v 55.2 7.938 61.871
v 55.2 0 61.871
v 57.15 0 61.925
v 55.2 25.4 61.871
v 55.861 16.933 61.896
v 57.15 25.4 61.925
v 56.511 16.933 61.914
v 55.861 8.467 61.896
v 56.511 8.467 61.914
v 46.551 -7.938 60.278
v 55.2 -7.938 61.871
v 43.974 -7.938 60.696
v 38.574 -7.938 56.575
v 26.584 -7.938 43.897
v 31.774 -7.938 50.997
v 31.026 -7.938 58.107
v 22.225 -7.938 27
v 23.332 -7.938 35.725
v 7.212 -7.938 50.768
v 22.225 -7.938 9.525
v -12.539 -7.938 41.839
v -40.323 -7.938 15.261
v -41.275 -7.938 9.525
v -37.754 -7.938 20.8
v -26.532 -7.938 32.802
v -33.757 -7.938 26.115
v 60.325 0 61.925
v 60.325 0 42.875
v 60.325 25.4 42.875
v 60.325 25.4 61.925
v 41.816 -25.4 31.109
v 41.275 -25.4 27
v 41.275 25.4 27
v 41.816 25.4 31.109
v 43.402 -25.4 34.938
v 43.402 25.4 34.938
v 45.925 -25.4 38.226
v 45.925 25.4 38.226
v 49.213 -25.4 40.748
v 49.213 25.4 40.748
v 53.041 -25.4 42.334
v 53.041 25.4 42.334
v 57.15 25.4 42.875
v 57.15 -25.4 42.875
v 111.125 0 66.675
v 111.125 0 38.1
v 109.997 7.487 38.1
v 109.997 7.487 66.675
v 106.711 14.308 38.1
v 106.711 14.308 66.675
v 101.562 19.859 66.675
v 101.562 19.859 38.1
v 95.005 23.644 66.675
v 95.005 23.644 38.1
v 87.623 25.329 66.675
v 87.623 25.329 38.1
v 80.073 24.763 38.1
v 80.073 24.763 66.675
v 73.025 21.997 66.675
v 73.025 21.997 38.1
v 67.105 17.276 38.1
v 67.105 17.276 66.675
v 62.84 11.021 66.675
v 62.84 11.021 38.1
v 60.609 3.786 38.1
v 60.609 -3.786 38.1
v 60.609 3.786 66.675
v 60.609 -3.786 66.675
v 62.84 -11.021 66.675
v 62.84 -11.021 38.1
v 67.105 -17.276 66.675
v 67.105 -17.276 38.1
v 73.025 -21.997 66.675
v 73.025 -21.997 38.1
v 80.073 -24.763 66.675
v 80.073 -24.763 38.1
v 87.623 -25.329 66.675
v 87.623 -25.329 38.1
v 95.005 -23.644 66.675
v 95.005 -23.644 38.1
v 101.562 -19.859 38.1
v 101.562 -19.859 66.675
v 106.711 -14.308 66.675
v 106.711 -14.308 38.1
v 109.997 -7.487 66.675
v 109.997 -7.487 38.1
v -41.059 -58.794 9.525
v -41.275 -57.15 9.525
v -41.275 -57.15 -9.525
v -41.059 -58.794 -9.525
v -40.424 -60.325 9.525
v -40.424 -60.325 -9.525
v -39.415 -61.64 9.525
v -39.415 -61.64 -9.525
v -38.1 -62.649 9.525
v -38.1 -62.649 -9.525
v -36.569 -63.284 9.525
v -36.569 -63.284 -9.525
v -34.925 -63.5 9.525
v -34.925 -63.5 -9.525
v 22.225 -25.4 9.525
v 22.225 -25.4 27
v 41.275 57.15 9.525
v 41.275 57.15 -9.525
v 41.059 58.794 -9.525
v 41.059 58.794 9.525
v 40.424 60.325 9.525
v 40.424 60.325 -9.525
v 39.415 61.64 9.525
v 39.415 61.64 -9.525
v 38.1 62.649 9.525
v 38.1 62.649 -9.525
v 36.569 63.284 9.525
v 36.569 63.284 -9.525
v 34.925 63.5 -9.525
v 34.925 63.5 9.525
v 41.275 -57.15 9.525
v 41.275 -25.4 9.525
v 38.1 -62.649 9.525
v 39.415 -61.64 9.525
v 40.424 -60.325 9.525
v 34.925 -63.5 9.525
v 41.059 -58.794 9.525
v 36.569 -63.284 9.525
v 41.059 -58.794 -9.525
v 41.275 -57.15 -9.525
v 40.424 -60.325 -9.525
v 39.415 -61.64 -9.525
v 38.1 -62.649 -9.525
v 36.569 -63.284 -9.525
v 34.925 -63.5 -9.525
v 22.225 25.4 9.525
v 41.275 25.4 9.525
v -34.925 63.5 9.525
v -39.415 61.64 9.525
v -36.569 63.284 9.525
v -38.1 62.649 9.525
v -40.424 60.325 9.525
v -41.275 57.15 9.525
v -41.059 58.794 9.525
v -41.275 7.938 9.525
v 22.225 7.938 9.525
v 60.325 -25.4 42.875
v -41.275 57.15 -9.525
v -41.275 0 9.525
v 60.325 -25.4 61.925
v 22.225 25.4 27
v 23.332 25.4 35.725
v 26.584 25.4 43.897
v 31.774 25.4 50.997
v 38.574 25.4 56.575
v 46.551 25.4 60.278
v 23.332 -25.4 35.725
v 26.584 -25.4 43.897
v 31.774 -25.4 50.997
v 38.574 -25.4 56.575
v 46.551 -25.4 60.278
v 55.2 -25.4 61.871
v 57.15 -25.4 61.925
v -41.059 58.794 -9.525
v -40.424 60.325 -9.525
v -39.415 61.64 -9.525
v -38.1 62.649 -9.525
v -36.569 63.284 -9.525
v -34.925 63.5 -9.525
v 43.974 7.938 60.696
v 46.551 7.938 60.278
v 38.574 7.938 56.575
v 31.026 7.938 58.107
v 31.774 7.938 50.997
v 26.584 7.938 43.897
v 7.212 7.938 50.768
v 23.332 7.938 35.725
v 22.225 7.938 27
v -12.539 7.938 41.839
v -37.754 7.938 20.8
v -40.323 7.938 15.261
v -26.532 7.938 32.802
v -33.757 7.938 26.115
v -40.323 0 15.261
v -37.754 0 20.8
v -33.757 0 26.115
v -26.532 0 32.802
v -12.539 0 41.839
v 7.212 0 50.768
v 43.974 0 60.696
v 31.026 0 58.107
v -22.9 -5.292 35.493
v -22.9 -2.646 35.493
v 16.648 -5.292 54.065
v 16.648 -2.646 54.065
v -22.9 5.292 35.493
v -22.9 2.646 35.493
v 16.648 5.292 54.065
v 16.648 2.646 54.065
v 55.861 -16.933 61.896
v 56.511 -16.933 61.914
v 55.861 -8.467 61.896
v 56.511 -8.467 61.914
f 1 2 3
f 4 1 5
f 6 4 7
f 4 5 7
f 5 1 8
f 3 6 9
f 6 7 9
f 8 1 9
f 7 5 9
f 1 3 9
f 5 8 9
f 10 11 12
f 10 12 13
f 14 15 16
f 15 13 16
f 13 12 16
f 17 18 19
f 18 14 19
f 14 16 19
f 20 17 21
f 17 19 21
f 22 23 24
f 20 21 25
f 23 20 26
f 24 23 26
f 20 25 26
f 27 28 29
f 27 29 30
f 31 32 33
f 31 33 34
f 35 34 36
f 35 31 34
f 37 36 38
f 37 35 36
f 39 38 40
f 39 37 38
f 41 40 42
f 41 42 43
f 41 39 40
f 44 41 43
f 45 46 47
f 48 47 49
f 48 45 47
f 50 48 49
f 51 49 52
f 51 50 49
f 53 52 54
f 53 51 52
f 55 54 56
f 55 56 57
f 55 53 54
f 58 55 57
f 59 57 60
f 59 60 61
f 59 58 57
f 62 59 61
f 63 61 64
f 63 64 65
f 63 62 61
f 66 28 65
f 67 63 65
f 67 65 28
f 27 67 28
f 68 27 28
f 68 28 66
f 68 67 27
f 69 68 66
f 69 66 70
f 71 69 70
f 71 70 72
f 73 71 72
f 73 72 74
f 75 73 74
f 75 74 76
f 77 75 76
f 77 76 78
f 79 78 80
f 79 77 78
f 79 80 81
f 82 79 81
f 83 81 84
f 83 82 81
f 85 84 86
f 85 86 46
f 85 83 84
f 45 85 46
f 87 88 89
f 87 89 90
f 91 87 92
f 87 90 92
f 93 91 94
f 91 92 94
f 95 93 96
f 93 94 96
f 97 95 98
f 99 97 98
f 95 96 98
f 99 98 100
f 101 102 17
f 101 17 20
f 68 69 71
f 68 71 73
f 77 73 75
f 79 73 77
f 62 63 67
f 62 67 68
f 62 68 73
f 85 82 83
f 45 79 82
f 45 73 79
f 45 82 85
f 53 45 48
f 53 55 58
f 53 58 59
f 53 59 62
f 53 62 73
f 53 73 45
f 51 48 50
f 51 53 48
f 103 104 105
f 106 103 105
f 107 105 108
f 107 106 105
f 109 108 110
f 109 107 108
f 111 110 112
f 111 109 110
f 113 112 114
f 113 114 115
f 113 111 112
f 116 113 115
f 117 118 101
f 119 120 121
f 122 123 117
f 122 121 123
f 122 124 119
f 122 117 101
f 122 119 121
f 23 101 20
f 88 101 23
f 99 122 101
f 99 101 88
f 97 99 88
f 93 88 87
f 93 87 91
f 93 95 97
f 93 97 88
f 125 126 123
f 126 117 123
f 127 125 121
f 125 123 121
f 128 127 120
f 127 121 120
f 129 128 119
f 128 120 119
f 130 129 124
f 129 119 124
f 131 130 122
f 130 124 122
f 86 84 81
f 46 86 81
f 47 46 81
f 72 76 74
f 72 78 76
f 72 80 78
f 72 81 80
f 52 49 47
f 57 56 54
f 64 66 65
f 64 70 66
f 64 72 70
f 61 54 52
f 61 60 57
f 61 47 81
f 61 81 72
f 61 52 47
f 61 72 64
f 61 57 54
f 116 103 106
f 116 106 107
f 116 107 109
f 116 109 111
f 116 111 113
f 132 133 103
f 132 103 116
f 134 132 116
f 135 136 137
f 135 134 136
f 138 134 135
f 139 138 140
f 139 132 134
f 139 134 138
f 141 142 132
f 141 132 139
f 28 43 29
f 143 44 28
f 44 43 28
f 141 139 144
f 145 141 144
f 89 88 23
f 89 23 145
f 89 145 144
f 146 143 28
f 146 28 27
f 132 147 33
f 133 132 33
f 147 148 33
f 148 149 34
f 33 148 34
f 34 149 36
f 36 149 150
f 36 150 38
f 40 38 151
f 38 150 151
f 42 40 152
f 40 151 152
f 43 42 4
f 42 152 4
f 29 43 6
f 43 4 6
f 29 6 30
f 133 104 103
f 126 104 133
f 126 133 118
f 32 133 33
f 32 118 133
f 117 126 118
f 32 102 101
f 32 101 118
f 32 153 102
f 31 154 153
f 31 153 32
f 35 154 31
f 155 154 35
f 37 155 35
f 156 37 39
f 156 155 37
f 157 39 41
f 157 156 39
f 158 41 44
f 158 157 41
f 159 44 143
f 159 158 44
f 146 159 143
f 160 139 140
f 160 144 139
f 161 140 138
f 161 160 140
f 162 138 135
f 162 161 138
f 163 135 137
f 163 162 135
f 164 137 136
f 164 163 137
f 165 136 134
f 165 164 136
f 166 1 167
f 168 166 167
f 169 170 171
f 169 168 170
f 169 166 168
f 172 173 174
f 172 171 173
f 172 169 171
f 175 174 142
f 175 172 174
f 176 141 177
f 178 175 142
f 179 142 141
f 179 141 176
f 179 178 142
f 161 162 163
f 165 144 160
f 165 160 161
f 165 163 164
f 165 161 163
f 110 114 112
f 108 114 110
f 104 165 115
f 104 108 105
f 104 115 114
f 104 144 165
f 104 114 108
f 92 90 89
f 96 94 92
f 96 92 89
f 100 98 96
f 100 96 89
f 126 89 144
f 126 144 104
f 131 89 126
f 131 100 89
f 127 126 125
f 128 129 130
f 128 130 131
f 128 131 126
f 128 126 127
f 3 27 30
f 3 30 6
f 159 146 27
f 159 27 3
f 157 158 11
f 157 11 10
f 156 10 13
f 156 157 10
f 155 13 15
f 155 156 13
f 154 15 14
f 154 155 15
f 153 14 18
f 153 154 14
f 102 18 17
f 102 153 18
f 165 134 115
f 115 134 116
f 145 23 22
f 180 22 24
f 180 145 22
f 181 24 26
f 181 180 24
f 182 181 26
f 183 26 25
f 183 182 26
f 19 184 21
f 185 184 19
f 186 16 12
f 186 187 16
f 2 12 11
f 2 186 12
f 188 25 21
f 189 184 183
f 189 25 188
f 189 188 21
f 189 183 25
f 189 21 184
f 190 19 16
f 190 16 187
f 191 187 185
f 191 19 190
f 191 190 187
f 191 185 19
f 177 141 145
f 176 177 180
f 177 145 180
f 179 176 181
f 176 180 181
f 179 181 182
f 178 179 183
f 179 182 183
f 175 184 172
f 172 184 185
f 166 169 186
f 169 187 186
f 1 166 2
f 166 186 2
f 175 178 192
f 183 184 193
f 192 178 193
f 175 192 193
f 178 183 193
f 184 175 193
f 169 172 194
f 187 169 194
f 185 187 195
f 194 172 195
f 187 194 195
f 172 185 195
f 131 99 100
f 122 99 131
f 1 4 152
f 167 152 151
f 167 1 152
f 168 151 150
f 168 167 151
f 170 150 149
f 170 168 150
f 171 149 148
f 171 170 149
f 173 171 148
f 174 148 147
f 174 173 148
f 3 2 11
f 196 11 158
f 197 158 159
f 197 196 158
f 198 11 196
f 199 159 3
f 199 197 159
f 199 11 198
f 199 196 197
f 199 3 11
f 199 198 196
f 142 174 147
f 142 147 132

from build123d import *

# Parameters (mm, degrees)
F1_DEPTH = 63.5
F2_DEPTH = 25.4
F3_DEPTH = 7.9375
F5_R     = 6.35


with BuildPart() as f1:
    # F0 (on Front) → F1 (new body, symmetric)
    with BuildSketch(Plane.XZ):
        Polygon((22.225, 9.525), (-41.275, 9.525), (-41.275, -9.525), (41.275, -9.525), (41.275, 9.525), align=None)
    extrude(amount=F1_DEPTH, both=True)

    # F0 (on Front) → F2 (join, symmetric)
    with BuildSketch(Plane.XZ):
        with BuildLine():
            Line((22.225, 27.0002), (22.225, 9.525))
            Line((22.225, 9.525), (41.275, 9.525))
            Line((41.275, 9.525), (41.275, 27.0002))
            ThreePointArc((41.275, 27.0002), (45.92468, 38.22552), (57.15, 42.8752))
            Line((57.15, 42.8752), (60.325, 42.8752))
            Line((60.325, 42.8752), (60.325, 61.9252))
            Line((60.325, 61.9252), (57.15, 61.9252))
            add(Edge.make_bspline(
                [(55.200179, 61.870729), (55.866888, 61.898963), (56.51717, 61.917172), (57.15, 61.9252)],
                knots=[109.131742, 109.131742, 109.131742, 109.131742, 111.504536, 111.504536, 111.504536, 111.504536], degree=3))
            ThreePointArc((55.200179, 61.870729), (31.774292, 50.996639), (22.225, 27.0002))
        make_face()
    extrude(amount=F2_DEPTH, both=True)

    # F0 (on Front) → F3 (join, symmetric)
    with BuildSketch(Plane.XZ):
        with BuildLine():
            add(Edge.make_bspline(
                [(-41.275, 9.525), (-40.876394, 38.067363), (24.536282, 60.572176), (55.200179, 61.870729)],
                knots=[0, 0, 0, 0, 109.131742, 109.131742, 109.131742, 109.131742], degree=3))
            Line((-41.275, 9.525), (22.225, 9.525))
            Line((22.225, 9.525), (22.225, 27.0002))
            ThreePointArc((22.225, 27.0002), (31.774292, 50.996639), (55.200179, 61.870729))
        make_face()
    extrude(amount=F3_DEPTH, both=True)

    # F0 (on Front) → F4 (revolve)
    with BuildSketch(Plane.XZ):
        Polygon((85.725, 66.675), (85.725, 61.9252), (85.725, 42.8752), (85.725, 38.1), (111.125, 38.1), (111.125, 66.675), align=None)
    revolve(axis=Axis((85.725, 0, 52.3875), (0, 0, 1)))

    # F5
    f5_edges = [f1.edges().sort_by_distance(p)[0] for p in [
        (-41.275, -63.5, 0),
        (41.275, -63.5, 0),
        (41.275, 63.5, 0),
        (-41.275, 63.5, 0),
    ]]
    fillet(f5_edges, radius=F5_R)


solid = f1.part
